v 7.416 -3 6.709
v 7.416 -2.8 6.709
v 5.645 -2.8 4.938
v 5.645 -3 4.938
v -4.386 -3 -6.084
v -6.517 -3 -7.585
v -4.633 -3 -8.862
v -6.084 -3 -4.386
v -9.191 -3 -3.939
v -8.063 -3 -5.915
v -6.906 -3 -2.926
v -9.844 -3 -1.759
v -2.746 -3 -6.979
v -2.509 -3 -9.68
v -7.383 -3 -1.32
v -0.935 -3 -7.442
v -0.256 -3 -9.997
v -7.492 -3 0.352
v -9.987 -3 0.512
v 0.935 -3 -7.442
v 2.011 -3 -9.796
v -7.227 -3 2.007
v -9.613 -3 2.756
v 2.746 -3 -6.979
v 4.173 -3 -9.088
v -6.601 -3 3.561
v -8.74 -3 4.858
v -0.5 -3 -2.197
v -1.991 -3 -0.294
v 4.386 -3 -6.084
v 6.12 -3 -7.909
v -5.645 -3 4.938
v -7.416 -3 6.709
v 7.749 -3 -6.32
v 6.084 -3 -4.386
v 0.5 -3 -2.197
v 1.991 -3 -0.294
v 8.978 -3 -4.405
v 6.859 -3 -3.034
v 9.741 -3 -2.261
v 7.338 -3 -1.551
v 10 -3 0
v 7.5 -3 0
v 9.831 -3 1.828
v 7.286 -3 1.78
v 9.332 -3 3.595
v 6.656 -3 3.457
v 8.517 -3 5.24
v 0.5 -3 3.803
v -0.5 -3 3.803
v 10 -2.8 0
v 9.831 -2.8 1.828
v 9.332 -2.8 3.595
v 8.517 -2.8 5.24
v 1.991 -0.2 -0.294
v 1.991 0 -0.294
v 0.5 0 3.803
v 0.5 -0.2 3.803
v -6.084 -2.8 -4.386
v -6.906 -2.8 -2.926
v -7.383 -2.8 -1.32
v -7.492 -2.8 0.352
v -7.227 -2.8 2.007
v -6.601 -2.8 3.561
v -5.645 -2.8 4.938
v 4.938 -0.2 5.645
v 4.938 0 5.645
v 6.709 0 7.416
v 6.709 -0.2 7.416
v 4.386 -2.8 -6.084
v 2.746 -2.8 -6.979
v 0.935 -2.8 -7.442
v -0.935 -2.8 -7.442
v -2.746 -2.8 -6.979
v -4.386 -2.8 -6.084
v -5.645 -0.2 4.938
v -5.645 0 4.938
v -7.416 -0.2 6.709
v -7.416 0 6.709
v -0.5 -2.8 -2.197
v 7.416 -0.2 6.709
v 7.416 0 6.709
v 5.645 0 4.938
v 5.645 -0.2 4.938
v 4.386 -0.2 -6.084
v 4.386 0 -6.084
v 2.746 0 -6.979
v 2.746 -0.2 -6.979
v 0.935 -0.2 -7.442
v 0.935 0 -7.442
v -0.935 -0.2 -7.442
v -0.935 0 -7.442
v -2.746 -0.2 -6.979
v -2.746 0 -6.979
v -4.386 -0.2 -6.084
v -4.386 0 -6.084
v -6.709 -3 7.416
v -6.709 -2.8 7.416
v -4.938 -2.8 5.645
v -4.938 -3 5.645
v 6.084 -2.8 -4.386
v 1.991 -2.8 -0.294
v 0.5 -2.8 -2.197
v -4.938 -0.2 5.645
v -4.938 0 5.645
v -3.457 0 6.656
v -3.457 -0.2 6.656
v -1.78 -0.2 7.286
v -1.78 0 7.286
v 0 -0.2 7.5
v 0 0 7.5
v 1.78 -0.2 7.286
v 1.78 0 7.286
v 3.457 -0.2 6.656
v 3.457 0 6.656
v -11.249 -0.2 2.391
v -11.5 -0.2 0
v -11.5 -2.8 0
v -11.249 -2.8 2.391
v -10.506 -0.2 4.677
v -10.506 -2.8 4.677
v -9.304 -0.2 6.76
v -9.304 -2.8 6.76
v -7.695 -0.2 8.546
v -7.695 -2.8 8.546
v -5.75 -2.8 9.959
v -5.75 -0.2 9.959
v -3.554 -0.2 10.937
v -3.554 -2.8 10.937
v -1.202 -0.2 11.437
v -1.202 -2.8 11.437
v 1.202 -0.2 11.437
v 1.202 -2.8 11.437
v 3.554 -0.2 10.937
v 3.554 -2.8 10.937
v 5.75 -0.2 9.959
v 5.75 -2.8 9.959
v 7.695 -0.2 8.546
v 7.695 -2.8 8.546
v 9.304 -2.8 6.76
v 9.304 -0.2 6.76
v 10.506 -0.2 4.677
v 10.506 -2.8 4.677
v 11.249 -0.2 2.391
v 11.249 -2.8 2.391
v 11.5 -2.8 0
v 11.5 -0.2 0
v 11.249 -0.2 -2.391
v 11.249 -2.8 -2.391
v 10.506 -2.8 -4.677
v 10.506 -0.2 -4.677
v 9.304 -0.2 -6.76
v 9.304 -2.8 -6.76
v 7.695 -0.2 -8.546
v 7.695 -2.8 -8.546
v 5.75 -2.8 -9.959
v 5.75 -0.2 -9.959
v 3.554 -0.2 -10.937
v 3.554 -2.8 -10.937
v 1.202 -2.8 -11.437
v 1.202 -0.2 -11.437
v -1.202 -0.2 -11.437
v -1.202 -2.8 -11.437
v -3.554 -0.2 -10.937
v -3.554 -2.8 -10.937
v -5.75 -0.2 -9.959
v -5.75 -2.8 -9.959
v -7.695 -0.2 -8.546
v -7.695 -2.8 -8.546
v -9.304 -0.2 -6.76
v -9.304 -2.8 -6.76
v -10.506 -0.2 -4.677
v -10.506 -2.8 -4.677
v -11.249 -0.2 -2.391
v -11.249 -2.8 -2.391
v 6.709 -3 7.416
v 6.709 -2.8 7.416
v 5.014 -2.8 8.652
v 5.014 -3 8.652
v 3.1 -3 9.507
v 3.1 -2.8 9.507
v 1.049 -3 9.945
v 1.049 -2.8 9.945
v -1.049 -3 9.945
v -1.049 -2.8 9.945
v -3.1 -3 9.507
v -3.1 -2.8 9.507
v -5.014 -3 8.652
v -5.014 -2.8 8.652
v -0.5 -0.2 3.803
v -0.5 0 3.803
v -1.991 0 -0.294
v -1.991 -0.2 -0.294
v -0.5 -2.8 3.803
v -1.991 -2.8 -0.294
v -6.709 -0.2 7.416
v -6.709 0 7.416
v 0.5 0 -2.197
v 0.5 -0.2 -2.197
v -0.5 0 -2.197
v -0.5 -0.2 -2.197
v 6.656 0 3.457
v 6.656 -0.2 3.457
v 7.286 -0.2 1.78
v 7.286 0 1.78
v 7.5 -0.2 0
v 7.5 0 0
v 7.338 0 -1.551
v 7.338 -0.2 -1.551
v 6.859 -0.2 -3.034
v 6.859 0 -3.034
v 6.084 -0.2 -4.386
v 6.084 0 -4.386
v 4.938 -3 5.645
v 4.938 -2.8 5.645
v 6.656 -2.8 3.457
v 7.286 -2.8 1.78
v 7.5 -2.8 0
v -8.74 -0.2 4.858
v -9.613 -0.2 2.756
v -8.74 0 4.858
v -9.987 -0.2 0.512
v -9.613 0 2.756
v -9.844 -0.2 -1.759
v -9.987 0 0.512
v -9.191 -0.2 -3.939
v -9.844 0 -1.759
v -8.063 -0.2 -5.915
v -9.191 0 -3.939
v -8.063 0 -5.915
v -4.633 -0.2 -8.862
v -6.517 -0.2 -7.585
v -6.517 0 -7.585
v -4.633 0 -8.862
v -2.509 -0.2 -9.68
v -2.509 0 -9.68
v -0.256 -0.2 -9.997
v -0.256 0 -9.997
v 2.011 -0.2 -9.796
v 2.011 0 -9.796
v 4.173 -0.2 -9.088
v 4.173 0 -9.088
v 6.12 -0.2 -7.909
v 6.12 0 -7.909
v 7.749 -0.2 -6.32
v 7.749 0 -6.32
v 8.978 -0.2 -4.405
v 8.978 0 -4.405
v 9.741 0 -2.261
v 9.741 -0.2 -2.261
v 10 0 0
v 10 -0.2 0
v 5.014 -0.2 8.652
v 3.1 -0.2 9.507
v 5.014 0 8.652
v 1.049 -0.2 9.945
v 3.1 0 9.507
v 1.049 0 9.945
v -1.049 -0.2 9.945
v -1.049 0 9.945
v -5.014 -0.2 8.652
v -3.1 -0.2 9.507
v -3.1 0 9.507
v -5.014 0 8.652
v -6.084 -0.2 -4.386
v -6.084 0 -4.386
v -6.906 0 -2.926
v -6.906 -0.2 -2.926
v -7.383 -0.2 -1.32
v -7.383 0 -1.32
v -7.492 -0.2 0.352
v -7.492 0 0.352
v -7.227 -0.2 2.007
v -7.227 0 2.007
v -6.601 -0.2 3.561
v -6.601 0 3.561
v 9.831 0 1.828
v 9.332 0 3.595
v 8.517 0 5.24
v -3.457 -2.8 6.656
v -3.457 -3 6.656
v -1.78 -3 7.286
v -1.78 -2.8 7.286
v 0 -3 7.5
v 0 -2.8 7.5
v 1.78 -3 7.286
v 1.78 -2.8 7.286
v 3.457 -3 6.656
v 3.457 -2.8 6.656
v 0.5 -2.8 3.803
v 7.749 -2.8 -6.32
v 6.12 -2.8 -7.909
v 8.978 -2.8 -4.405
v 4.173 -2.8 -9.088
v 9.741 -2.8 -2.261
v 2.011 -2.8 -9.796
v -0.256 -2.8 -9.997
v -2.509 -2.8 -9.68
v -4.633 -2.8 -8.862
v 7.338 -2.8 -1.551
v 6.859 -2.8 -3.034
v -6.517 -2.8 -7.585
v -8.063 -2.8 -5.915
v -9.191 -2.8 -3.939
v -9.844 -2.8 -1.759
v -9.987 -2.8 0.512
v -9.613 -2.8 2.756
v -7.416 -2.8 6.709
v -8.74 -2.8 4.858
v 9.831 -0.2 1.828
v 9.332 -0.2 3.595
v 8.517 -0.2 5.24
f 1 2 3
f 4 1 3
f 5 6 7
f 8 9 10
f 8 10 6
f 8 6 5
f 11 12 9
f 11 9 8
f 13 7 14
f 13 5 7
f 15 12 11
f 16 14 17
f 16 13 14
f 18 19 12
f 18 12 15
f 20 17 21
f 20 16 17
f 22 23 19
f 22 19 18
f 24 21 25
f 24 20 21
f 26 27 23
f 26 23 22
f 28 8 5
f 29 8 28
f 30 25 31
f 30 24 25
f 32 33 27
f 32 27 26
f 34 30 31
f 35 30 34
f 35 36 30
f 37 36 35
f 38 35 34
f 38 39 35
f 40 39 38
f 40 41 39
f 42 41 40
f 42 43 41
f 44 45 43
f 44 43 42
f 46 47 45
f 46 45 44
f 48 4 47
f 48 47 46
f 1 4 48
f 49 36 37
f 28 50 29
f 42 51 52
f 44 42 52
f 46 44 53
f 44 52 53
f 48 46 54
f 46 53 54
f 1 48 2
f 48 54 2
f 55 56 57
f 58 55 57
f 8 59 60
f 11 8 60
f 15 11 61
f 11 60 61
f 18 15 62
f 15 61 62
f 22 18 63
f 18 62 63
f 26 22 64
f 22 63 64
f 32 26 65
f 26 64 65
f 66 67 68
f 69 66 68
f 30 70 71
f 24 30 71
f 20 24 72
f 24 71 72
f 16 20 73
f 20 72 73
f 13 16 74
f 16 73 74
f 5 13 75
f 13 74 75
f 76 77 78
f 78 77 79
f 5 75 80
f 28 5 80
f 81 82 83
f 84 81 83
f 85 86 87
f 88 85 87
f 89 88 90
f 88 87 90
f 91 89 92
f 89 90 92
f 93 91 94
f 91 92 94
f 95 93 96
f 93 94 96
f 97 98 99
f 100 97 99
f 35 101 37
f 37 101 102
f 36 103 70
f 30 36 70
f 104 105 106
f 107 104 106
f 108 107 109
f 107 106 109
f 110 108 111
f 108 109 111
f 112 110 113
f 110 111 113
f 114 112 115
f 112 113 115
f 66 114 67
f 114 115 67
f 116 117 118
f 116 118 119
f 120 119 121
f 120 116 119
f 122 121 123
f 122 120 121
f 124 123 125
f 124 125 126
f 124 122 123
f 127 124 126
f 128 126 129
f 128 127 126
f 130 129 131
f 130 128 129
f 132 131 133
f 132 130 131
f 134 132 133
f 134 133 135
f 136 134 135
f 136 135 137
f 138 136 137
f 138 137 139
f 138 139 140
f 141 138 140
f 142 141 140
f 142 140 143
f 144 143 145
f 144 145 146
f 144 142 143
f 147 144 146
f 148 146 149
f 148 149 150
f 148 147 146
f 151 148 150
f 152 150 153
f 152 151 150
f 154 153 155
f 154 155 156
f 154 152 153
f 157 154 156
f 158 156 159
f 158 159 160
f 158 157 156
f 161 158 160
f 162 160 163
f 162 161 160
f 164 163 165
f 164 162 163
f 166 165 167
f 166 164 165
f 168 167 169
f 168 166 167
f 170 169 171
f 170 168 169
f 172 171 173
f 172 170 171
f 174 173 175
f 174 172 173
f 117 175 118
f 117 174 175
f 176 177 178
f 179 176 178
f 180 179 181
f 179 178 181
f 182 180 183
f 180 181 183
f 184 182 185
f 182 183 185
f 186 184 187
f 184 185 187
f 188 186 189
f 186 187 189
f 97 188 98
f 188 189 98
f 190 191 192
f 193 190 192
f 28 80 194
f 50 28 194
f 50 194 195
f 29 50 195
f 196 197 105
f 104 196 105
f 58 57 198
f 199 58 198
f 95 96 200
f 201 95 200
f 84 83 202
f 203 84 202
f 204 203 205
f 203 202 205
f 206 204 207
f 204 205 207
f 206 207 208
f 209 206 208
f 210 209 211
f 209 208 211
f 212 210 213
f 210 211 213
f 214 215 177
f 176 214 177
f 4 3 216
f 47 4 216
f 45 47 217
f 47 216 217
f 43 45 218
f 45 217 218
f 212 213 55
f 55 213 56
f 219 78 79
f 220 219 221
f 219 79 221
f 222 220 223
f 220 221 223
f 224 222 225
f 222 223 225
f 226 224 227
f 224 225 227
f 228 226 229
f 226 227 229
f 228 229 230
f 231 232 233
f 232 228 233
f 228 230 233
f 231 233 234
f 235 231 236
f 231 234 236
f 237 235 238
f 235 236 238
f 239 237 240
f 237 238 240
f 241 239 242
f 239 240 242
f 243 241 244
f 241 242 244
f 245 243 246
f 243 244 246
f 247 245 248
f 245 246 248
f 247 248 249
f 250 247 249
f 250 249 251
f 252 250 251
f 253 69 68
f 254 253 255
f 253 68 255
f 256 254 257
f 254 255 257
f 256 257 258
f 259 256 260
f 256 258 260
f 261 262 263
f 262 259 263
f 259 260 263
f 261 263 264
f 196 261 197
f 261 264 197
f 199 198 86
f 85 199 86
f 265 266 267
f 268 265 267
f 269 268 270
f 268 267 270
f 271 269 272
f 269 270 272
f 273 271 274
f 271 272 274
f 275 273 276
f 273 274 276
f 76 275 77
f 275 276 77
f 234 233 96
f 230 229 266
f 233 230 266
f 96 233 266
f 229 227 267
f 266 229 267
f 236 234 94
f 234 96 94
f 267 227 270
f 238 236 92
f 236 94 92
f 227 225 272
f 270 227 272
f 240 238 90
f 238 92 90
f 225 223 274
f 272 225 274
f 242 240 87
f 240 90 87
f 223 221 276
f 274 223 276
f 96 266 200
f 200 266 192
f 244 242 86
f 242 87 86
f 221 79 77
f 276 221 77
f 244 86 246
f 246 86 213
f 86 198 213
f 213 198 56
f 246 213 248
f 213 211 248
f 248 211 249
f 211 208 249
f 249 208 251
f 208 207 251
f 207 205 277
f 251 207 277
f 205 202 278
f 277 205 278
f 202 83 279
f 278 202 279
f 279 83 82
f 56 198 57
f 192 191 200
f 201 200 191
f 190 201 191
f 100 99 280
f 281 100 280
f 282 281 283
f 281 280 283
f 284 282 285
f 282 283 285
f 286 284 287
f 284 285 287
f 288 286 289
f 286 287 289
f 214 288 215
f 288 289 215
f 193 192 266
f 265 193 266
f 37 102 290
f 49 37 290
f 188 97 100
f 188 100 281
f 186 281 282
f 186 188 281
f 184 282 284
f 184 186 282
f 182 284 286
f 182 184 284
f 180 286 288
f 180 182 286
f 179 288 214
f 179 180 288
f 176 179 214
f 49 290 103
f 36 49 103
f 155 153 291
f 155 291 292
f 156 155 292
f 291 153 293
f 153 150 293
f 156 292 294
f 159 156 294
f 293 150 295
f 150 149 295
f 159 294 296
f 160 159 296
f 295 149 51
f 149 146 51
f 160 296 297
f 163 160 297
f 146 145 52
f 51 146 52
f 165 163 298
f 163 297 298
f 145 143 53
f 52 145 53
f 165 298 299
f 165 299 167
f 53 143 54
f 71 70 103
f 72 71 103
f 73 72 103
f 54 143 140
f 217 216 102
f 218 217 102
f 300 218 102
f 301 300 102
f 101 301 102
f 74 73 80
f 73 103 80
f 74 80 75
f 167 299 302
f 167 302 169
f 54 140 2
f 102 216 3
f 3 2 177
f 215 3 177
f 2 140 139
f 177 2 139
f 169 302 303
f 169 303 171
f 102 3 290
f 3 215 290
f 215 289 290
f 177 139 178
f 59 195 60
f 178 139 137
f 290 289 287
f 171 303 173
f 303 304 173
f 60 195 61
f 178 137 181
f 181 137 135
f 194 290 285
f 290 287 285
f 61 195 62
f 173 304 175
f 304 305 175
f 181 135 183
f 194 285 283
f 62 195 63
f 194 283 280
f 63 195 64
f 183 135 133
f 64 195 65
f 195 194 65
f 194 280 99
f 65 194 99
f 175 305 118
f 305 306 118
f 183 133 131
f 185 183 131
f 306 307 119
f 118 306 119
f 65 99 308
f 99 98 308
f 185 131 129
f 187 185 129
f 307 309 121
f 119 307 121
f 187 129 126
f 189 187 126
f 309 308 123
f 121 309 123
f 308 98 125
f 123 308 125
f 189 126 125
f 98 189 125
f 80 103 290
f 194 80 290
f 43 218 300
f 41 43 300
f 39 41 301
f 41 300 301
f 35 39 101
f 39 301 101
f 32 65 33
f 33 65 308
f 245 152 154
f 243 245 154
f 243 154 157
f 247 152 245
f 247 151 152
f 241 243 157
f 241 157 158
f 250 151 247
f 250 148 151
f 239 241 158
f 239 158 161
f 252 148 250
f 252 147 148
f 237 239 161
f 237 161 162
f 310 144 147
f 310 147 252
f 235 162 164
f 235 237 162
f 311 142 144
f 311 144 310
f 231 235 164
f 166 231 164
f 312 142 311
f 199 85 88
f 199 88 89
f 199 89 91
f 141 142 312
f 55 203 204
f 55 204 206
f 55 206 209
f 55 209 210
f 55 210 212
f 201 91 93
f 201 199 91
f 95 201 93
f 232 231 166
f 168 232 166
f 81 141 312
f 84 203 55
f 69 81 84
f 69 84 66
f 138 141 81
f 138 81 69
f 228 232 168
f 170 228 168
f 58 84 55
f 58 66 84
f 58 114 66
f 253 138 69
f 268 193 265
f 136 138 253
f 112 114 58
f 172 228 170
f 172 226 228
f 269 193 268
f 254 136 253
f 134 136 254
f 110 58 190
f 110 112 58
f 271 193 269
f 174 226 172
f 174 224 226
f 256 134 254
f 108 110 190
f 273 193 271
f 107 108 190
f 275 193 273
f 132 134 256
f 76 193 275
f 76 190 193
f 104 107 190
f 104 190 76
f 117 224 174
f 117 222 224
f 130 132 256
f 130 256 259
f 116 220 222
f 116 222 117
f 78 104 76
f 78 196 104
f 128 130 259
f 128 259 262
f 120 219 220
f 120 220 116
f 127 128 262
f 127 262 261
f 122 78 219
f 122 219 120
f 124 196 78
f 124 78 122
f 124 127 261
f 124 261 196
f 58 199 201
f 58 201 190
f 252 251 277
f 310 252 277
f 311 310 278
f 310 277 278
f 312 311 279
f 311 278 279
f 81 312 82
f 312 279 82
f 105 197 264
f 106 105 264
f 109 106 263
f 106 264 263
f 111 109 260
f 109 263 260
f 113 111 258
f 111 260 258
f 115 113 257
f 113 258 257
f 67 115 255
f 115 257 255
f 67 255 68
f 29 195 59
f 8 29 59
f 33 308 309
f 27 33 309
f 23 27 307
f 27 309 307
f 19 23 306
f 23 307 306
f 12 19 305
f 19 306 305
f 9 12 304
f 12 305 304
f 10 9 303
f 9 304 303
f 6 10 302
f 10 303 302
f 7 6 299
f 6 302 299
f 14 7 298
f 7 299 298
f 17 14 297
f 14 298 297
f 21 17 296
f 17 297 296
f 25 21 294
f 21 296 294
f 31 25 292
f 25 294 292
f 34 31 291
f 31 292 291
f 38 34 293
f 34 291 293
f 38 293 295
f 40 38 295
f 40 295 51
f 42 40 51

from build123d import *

# Parameters (mm, degrees)
F1_DEPTH = 3
F2_DEPTH = 3
F4_DEPTH = 3
F6_R     = 11.5
F7_DEPTH = 2.6


with BuildPart() as f1:
    # F0 (on Front) → F1 (new body)
    with BuildSketch(Plane.XZ):
        with BuildLine():
            ThreePointArc((-7.4157768365, 6.7086700553), (-3.5945953621, -9.331606731), (10, 0))
            ThreePointArc((10, 0), (9.331606731, 3.5945953621), (7.4157768365, 6.7086700553))
            Line((7.4157768365, 6.7086700553), (5.6450560127, 4.9379492315))
            ThreePointArc((5.6450560127, 4.9379492315), (7.0209657489, 2.6374305588), (7.5, 0))
            ThreePointArc((7.5, 0), (-2.6374305588, -7.0209657489), (-5.6450560127, 4.9379492315))
            Line((-5.6450560127, 4.9379492315), (-7.4157768365, 6.7086700553))
        make_face()
    extrude(amount=F1_DEPTH)

    # F3 (on Front) → F4 (join, through all)
    with BuildSketch(Plane.XZ):
        with BuildLine():
            Line((-1.9912281105, -0.2941718356), (-6.0835066474, -4.3864503726))
            ThreePointArc((-6.0835066474, -4.3864503726), (-5.7118298294, -4.8605555238), (-5.3033008589, -5.3033008589))
            Line((-5.3033008589, -5.3033008589), (-0.5, -0.5))
            Line((-0.5, -0.5), (-0.5, 1.1970562748))
            Line((-0.5, 1.1970562748), (-1.9912281105, -0.2941718356))
        make_face()
        with BuildLine():
            Line((-0.5, -0.5), (-5.3033008589, -5.3033008589))
            ThreePointArc((-5.3033008589, -5.3033008589), (-4.8605555238, -5.7118298294), (-4.3864503726, -6.0835066474))
            Line((-4.3864503726, -6.0835066474), (-0.5, -2.1970562748))
            Line((-0.5, -2.1970562748), (-0.5, -0.5))
        make_face()
        Polygon((-0.5, 3.8029437252), (-1.9912281105, -0.2941718356), (-0.5, 1.1970562748), align=None)
        with BuildLine():
            Line((0.5, -0.5), (5.3033008589, -5.3033008589))
            ThreePointArc((5.3033008589, -5.3033008589), (5.7118298294, -4.8605555238), (6.0835066474, -4.3864503726))
            Line((6.0835066474, -4.3864503726), (1.9912281105, -0.2941718356))
            Line((1.9912281105, -0.2941718356), (0.5, 1.1970562748))
            Line((0.5, 1.1970562748), (0.5, -0.5))
        make_face()
        with BuildLine():
            Line((0.5, -2.1970562748), (4.3864503726, -6.0835066474))
            ThreePointArc((4.3864503726, -6.0835066474), (4.8605555238, -5.7118298294), (5.3033008589, -5.3033008589))
            Line((5.3033008589, -5.3033008589), (0.5, -0.5))
            Line((0.5, -0.5), (0.5, -2.1970562748))
        make_face()
        Polygon((0.5, 3.8029437252), (0.5, 1.1970562748), (1.9912281105, -0.2941718356), align=None)
    extrude(amount=F4_DEPTH)



with BuildPart() as f2:
    # F0 (on Front) → F2 (new body, through all)
    with BuildSketch(Plane.XZ):
        with BuildLine():
            Line((4.9379492315, 5.6450560127), (6.7086700553, 7.4157768365))
            ThreePointArc((6.7086700553, 7.4157768365), (0, 10), (-6.7086700553, 7.4157768365))
            Line((-6.7086700553, 7.4157768365), (-4.9379492315, 5.6450560127))
            ThreePointArc((-4.9379492315, 5.6450560127), (0, 7.5), (4.9379492315, 5.6450560127))
        make_face()
    extrude(amount=F2_DEPTH)


with BuildPart() as f1_1:
    add(f1.part)

    add(f2.part)  # F7 merges F2
    # F6 (on offset) → F7 (join)
    with BuildSketch(Plane(origin=(0, -0.2, 0), x_dir=(-1, 0, 0), z_dir=(0, 1, 0))):
        Circle(F6_R)
    extrude(amount=-F7_DEPTH)


solid = f1_1.part
